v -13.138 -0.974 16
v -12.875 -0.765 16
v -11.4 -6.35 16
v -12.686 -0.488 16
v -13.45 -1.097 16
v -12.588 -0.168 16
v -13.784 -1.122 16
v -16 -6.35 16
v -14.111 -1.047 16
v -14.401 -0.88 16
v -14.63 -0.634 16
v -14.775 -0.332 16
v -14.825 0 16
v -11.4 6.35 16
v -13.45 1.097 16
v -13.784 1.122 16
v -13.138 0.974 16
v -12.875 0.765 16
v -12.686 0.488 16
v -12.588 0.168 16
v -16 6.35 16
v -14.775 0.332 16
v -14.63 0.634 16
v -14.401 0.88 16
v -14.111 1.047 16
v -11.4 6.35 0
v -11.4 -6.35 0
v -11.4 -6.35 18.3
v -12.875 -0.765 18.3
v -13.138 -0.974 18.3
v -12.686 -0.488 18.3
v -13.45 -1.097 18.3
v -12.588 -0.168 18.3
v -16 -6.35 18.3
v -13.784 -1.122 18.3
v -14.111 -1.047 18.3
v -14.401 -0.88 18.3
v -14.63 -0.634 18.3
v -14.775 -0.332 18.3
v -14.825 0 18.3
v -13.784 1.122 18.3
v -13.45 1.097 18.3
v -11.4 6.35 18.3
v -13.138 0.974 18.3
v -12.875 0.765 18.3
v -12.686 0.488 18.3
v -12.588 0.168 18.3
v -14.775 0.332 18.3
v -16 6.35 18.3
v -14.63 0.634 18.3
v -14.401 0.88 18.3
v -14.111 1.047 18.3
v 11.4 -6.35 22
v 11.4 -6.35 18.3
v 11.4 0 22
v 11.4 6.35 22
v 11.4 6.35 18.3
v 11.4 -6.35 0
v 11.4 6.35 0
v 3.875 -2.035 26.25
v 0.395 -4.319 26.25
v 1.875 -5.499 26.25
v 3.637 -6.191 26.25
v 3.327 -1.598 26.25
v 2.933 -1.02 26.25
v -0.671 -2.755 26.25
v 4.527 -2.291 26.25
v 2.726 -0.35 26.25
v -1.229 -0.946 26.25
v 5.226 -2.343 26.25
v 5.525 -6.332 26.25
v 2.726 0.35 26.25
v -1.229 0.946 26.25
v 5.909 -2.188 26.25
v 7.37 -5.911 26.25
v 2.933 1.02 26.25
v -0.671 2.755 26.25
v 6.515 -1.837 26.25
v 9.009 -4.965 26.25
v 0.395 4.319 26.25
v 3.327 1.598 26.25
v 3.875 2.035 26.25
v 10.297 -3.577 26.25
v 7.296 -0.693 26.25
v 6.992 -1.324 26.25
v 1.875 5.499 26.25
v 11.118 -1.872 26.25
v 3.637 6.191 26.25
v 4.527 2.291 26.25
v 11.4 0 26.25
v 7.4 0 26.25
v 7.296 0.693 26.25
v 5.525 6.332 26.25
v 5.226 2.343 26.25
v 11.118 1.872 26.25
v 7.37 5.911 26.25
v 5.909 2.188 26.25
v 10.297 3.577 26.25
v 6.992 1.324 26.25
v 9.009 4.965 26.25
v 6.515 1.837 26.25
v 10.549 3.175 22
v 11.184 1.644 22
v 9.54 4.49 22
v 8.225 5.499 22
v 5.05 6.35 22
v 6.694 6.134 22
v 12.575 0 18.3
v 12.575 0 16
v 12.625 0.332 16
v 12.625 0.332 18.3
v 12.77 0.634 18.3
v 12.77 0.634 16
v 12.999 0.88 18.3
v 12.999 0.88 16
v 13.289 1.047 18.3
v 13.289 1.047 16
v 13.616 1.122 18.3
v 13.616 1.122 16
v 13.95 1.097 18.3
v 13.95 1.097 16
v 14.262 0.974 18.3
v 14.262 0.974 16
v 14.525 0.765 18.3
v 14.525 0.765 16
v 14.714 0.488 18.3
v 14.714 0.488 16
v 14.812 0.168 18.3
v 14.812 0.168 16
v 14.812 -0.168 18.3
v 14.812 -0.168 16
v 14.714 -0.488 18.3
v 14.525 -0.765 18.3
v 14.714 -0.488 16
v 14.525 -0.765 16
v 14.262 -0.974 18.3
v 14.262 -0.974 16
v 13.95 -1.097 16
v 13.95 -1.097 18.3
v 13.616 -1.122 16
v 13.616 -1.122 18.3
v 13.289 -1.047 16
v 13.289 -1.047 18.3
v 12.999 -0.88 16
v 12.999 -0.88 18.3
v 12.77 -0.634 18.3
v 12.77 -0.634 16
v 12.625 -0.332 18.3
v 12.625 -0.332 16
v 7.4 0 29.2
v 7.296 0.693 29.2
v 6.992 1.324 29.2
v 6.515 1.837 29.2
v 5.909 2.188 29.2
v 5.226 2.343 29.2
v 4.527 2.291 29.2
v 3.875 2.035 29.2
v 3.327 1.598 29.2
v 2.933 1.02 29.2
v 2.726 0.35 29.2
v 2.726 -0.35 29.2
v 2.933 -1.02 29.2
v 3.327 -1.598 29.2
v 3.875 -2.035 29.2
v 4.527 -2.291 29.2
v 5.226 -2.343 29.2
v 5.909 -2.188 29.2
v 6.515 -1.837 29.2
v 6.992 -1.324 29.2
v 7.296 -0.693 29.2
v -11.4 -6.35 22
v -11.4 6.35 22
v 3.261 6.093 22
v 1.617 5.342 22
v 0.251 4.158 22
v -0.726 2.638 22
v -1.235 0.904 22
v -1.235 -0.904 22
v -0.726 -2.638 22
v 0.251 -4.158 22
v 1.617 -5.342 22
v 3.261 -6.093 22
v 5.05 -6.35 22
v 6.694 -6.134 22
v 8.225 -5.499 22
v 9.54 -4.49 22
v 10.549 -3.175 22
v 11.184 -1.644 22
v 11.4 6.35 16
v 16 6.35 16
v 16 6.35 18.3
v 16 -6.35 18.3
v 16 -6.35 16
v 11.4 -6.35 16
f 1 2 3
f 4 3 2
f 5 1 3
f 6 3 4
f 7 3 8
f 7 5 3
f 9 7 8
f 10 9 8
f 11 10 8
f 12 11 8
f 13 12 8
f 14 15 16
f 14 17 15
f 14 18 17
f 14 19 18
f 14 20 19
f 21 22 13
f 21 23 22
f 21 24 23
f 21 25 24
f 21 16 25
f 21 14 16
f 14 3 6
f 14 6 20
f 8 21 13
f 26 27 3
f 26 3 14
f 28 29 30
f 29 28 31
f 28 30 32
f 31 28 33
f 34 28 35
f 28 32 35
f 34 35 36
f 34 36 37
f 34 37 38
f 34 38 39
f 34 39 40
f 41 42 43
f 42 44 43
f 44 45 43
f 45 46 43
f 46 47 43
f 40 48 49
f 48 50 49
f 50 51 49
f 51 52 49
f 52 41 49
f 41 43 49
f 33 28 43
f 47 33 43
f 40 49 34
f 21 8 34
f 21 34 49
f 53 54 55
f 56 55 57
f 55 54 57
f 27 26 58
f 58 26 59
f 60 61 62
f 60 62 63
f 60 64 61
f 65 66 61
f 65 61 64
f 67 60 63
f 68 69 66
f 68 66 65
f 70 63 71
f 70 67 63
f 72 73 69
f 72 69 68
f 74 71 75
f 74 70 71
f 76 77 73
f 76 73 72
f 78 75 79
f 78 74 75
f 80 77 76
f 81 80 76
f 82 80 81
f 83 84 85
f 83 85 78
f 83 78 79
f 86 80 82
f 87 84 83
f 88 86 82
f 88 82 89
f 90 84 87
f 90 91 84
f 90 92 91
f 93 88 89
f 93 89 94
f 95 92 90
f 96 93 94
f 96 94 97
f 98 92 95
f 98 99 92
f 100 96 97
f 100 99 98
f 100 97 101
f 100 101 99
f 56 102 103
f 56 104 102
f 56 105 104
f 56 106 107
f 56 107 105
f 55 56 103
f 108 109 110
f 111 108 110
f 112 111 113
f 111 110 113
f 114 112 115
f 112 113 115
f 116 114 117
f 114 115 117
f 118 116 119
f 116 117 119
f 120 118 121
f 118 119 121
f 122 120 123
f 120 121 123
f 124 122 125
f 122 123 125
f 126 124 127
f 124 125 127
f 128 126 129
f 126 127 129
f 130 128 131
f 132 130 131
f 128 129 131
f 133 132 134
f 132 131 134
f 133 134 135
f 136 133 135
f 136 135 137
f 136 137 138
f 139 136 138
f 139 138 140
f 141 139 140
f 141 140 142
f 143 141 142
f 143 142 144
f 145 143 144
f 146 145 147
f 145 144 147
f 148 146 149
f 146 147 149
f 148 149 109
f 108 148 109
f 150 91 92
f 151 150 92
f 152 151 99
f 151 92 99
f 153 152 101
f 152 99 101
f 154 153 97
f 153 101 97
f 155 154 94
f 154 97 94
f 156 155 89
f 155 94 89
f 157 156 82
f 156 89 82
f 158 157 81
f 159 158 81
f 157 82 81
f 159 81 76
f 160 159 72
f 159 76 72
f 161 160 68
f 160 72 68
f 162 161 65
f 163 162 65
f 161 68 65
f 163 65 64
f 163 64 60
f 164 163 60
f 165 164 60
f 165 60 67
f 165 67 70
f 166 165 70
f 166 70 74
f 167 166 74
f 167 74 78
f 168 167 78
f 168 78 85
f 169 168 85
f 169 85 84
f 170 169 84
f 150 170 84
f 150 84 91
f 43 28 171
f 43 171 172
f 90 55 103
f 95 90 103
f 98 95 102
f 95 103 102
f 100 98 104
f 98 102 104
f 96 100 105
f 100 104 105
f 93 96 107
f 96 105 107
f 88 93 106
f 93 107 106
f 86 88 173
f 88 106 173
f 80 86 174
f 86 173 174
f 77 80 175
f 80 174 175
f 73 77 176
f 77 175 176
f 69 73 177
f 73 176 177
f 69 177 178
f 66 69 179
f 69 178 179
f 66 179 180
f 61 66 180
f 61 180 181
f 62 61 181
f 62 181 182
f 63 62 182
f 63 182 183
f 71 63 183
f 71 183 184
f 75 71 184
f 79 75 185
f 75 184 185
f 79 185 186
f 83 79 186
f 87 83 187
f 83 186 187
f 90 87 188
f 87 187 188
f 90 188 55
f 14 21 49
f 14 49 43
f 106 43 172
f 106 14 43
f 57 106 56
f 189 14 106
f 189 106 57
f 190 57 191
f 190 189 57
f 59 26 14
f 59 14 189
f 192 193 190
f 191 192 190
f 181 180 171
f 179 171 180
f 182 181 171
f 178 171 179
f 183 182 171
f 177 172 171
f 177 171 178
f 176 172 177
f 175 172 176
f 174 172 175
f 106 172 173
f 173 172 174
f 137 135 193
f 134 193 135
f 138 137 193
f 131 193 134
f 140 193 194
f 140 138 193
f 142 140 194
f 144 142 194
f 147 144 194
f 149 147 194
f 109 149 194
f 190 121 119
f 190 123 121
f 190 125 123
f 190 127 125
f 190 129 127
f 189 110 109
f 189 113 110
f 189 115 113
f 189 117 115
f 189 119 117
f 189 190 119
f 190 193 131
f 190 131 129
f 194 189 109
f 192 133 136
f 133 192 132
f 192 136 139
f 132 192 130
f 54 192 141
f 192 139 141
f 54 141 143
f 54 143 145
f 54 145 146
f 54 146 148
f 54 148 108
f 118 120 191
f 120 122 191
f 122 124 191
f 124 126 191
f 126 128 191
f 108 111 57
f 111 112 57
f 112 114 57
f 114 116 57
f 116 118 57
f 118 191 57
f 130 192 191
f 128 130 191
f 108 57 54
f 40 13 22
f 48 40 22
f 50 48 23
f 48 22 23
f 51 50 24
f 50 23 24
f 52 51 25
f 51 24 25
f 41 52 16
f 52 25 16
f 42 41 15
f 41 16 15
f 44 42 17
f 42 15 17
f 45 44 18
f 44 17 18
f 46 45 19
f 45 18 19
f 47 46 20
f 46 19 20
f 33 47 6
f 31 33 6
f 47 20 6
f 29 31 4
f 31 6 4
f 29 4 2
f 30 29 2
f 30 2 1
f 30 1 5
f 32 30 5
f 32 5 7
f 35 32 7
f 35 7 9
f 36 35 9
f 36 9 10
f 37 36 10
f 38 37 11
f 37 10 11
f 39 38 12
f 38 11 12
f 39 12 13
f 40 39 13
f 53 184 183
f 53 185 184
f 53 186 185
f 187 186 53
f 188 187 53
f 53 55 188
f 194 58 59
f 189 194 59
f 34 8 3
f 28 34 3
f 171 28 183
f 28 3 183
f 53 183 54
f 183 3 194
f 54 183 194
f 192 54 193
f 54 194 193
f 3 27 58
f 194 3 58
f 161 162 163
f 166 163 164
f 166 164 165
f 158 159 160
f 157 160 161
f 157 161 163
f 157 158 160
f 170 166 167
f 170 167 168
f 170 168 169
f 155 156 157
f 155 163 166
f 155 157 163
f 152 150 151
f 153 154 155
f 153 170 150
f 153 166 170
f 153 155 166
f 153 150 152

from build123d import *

# Parameters (mm, degrees)
SKETCH1_W           = 22.8
SKETCH1_H           = 12.7
BODY_DEPTH          = 22
SKETCH2_W           = 4.6
SKETCH2_H           = 12.7
SKETCH2_R           = 1.125
BOSS_EXTRUDE2_DEPTH = 2.3
SKETCH3_R           = 2.35
BOSS_EXTRUDE3_DEPTH = 7.2
SKETCH4_R           = 6.35
BOSS_EXTRUDE4_DEPTH = 4.25


with BuildPart() as part:
    # Sketch1 → Body (new body)
    with BuildSketch(Plane.XY):
        Rectangle(SKETCH1_W, SKETCH1_H)
    extrude(amount=BODY_DEPTH)

    # Sketch2 → Boss-Extrude2 (add)
    with BuildSketch(Plane(origin=(0, 0, 16), x_dir=(-1, 0, 0), z_dir=(0, 0, -1))):
        with Locations((13.7, 0)):
            Rectangle(SKETCH2_W, SKETCH2_H)
        with Locations((13.7, 0)):
            Circle(SKETCH2_R, mode=Mode.SUBTRACT)
        with Locations((-13.7, 0)):
            Rectangle(SKETCH2_W, SKETCH2_H)
        with Locations((-13.7, 0)):
            Circle(SKETCH2_R, mode=Mode.SUBTRACT)
    extrude(amount=-BOSS_EXTRUDE2_DEPTH)

    # Sketch3 → Boss-Extrude3 (add)
    with BuildSketch(Plane.XY.offset(22)):
        with Locations((5.05, 0)):
            Circle(SKETCH3_R)
    extrude(amount=BOSS_EXTRUDE3_DEPTH)

    # Sketch4 → Boss-Extrude4 (add)
    with BuildSketch(Plane.XY.offset(22)):
        with Locations((5.05, 0)):
            Circle(SKETCH4_R)
    extrude(amount=BOSS_EXTRUDE4_DEPTH)


solid = part.part
